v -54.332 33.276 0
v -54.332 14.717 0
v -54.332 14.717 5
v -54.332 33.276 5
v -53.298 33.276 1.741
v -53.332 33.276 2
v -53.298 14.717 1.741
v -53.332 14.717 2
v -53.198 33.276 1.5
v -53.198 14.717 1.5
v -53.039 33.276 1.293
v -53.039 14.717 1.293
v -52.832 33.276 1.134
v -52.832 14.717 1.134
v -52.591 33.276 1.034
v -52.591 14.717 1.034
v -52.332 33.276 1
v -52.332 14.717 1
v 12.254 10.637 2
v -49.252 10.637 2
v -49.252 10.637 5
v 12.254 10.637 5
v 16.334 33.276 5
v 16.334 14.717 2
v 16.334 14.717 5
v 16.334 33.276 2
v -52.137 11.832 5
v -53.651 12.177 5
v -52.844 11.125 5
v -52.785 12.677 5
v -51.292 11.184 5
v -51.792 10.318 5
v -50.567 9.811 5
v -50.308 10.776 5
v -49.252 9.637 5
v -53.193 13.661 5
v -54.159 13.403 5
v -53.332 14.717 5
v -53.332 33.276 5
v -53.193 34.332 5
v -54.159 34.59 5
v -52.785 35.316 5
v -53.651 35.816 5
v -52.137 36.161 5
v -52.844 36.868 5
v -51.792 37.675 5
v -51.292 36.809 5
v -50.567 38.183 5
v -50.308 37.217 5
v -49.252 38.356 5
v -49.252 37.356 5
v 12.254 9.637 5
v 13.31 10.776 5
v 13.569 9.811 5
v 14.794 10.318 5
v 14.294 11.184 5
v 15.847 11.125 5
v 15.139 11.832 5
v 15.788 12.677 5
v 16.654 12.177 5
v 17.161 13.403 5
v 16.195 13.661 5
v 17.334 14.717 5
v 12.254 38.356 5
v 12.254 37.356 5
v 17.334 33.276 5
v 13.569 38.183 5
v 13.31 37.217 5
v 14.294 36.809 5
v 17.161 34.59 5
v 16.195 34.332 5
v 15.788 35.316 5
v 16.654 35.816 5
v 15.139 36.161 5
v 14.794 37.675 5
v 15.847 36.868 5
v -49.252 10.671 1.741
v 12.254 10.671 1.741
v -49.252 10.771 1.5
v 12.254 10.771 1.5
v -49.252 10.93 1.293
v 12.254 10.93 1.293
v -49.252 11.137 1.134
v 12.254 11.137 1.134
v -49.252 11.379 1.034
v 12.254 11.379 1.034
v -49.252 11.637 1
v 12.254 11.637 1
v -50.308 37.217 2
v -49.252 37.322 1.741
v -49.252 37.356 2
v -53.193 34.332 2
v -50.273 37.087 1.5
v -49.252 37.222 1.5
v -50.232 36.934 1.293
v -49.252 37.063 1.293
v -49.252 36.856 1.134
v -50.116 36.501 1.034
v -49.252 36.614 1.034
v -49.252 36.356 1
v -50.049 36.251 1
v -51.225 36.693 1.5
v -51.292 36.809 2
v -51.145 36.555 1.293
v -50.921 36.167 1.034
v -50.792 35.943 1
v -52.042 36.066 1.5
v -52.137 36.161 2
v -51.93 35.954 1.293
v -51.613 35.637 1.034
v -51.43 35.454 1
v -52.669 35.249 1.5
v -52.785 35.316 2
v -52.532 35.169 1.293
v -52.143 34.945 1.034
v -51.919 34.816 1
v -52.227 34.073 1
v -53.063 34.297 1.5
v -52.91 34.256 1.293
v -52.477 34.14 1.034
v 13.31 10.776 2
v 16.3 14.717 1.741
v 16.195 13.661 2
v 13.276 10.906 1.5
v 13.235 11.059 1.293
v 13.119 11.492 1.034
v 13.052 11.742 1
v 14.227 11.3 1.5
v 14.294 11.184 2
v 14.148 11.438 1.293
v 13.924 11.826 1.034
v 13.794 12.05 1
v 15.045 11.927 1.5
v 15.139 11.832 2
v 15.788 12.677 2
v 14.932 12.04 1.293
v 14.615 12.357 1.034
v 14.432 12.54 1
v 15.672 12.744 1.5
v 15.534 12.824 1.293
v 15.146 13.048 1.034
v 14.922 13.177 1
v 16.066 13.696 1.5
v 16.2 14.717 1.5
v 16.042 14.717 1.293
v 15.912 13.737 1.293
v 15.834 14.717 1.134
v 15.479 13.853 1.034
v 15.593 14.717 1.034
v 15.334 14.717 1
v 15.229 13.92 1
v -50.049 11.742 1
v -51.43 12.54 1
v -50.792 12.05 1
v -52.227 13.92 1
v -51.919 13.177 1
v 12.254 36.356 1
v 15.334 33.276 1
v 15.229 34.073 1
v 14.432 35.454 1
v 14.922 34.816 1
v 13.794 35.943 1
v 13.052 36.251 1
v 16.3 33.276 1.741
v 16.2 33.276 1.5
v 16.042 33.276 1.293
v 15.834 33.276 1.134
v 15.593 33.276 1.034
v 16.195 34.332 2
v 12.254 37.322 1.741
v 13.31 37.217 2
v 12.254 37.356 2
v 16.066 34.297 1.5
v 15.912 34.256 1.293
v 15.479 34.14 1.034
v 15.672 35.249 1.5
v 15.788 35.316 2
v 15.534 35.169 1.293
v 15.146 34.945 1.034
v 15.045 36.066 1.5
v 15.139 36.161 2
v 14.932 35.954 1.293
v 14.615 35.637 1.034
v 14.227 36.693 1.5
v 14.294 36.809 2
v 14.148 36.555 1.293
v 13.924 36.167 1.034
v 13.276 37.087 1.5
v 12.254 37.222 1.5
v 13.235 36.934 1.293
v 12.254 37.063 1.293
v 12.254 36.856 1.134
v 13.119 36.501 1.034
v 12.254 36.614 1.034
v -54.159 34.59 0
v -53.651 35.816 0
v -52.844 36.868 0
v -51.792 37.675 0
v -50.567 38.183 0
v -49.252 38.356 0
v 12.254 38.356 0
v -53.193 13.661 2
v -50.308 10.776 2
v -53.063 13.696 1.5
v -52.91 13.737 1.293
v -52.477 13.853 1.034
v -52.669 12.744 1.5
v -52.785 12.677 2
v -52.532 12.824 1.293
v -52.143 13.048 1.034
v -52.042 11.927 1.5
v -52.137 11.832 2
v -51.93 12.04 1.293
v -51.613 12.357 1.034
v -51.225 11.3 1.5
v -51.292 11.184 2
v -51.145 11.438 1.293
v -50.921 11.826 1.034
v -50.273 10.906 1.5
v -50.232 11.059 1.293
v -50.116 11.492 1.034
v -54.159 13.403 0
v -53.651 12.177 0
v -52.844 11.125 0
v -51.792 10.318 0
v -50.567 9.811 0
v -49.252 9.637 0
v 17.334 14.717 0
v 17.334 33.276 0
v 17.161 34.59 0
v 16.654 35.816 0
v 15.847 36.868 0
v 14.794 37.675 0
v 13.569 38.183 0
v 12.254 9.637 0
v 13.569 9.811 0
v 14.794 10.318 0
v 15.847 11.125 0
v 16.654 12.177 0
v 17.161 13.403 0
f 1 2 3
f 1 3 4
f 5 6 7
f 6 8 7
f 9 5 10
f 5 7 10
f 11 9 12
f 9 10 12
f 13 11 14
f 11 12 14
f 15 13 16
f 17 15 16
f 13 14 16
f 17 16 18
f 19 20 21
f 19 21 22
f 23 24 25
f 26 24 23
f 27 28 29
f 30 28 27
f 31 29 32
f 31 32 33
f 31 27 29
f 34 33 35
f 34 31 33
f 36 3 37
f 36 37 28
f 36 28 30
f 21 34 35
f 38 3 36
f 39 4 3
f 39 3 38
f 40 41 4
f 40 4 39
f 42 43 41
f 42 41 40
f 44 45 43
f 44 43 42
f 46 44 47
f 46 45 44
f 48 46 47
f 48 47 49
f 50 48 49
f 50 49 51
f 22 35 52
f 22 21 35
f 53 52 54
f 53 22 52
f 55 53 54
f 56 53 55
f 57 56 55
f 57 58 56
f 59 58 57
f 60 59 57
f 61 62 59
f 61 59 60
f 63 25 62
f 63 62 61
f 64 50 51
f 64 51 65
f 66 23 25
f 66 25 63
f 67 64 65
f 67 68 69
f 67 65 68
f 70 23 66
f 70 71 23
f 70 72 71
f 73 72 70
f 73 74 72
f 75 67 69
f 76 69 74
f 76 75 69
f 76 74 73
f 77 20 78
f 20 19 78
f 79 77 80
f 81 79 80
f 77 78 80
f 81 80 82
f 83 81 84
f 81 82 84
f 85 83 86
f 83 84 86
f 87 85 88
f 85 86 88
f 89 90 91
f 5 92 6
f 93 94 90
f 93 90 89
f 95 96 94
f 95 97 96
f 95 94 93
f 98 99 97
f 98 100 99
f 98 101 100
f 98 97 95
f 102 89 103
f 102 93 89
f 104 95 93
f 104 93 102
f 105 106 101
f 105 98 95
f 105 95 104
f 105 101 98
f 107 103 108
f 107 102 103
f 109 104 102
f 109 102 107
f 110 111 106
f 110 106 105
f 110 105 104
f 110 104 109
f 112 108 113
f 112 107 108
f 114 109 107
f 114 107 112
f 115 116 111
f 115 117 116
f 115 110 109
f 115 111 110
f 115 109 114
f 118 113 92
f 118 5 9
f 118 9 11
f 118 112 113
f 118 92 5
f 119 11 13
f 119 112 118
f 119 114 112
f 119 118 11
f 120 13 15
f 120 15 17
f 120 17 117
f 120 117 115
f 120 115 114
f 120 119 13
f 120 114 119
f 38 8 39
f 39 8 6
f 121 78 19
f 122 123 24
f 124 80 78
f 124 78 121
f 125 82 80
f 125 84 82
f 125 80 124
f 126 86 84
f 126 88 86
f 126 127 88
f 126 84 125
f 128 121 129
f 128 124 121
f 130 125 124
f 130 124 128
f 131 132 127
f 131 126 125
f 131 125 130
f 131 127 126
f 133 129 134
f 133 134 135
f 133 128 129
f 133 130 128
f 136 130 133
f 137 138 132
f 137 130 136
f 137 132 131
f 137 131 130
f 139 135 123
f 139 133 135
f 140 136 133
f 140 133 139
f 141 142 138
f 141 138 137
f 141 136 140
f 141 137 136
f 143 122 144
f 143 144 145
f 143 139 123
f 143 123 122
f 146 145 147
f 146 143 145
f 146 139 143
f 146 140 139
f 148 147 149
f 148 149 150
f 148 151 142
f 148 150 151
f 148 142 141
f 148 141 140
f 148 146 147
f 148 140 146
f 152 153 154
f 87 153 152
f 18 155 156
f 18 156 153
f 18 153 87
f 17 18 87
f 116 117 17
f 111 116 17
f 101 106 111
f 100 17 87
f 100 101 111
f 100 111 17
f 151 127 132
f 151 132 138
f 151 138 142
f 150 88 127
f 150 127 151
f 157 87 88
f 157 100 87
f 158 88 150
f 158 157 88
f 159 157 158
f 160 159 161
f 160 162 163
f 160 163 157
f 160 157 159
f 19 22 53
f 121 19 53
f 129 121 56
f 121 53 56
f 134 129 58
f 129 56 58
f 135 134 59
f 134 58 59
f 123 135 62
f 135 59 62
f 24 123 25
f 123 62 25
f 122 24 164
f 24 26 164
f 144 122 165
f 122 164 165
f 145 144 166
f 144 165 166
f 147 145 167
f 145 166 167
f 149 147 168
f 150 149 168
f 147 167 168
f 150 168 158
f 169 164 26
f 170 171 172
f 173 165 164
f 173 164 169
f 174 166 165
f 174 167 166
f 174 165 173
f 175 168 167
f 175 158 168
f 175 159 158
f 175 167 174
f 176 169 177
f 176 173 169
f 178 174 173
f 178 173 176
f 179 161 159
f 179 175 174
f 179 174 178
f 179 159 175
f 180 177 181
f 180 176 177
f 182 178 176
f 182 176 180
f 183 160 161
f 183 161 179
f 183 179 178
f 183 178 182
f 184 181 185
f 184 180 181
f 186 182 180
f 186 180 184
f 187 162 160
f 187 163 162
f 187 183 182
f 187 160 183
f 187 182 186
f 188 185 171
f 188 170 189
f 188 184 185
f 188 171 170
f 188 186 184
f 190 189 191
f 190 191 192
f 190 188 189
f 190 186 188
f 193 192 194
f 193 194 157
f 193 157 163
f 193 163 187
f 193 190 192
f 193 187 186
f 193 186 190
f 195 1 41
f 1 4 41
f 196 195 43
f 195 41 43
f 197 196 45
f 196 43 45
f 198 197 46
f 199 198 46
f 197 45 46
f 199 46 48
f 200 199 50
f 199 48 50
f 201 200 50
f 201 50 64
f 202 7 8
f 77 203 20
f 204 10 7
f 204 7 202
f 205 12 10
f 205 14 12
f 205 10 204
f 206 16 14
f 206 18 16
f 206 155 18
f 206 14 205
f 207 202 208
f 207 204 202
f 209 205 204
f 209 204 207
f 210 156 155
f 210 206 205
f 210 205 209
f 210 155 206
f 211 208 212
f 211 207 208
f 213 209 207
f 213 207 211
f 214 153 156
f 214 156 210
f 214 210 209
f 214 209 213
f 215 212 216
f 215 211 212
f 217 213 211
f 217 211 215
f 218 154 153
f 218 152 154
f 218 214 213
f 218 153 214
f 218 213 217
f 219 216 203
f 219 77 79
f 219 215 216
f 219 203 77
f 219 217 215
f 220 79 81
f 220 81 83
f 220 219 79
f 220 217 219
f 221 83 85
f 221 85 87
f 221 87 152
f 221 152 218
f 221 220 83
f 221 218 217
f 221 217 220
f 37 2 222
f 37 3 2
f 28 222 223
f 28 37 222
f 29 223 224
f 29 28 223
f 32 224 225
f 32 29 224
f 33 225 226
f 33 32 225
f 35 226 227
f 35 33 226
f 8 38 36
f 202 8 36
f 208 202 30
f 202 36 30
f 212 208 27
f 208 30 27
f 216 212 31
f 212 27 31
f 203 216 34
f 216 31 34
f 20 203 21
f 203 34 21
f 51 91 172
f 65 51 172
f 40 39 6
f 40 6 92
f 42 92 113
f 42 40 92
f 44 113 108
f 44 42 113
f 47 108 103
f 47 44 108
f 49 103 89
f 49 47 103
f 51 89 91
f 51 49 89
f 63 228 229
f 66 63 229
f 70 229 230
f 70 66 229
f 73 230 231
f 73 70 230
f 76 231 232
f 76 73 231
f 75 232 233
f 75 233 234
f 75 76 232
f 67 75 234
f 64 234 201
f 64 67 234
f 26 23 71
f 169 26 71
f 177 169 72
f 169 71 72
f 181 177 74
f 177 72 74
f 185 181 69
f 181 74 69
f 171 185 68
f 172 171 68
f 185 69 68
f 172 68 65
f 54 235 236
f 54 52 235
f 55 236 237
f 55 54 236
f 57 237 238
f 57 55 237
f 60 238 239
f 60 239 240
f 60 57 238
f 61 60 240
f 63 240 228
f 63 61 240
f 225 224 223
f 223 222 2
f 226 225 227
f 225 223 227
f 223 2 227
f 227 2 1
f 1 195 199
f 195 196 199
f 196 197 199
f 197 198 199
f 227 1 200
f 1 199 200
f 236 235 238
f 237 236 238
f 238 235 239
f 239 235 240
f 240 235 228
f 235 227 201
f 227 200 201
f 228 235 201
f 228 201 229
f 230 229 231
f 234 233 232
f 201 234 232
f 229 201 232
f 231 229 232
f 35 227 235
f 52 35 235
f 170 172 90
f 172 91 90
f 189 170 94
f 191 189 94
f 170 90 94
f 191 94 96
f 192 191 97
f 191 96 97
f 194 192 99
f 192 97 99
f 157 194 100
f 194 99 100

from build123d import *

# Parameters (mm, degrees)
F0_W     = 71.666194126
F0_H     = 28.7182237953
F1_DEPTH = 5
F2_R     = 5.08
F3_R     = 5.08
F4_R     = 5.08
F5_R     = 5.08
F6_T     = -1
F7_R     = 1


with BuildPart() as f1:
    # F0 (on Top) → F1 (new body)
    with BuildSketch(Plane.XY):
        with Locations((-18.4986749664, 23.9965328947)):
            Rectangle(F0_W, F0_H)
    extrude(amount=F1_DEPTH)

    # F2
    f2_edges = [f1.edges().sort_by_distance(p)[0] for p in [
        (-54.331772, 38.355645, 2.5),
    ]]
    fillet(f2_edges, radius=F2_R)

    # F3
    f3_edges = [f1.edges().sort_by_distance(p)[0] for p in [
        (-54.331772, 9.637421, 2.5),
    ]]
    fillet(f3_edges, radius=F3_R)

    # F4
    f4_edges = [f1.edges().sort_by_distance(p)[0] for p in [
        (17.334422, 9.637421, 2.5),
    ]]
    fillet(f4_edges, radius=F4_R)

    # F5
    f5_edges = [f1.edges().sort_by_distance(p)[0] for p in [
        (17.334422, 38.355645, 2.5),
    ]]
    fillet(f5_edges, radius=F5_R)

    # F6
    f6_openings = [f1.faces().sort_by_distance(p)[0] for p in [
        (-18.498675, 23.996533, 5),
    ]]
    offset(amount=F6_T, openings=f6_openings)

    # F7
    f7_edges = [f1.edges().sort_by_distance(p)[0] for p in [
        (-52.136768, 11.832425, 1),
        (-18.498675, 10.637421, 1),
        (15.139418, 11.832425, 1),
        (16.334422, 23.996533, 1),
        (15.139418, 36.16064, 1),
        (-18.498675, 37.355645, 1),
        (-52.136768, 36.16064, 1),
        (-53.331772, 23.996533, 1),
    ]]
    fillet(f7_edges, radius=F7_R)


solid = f1.part
